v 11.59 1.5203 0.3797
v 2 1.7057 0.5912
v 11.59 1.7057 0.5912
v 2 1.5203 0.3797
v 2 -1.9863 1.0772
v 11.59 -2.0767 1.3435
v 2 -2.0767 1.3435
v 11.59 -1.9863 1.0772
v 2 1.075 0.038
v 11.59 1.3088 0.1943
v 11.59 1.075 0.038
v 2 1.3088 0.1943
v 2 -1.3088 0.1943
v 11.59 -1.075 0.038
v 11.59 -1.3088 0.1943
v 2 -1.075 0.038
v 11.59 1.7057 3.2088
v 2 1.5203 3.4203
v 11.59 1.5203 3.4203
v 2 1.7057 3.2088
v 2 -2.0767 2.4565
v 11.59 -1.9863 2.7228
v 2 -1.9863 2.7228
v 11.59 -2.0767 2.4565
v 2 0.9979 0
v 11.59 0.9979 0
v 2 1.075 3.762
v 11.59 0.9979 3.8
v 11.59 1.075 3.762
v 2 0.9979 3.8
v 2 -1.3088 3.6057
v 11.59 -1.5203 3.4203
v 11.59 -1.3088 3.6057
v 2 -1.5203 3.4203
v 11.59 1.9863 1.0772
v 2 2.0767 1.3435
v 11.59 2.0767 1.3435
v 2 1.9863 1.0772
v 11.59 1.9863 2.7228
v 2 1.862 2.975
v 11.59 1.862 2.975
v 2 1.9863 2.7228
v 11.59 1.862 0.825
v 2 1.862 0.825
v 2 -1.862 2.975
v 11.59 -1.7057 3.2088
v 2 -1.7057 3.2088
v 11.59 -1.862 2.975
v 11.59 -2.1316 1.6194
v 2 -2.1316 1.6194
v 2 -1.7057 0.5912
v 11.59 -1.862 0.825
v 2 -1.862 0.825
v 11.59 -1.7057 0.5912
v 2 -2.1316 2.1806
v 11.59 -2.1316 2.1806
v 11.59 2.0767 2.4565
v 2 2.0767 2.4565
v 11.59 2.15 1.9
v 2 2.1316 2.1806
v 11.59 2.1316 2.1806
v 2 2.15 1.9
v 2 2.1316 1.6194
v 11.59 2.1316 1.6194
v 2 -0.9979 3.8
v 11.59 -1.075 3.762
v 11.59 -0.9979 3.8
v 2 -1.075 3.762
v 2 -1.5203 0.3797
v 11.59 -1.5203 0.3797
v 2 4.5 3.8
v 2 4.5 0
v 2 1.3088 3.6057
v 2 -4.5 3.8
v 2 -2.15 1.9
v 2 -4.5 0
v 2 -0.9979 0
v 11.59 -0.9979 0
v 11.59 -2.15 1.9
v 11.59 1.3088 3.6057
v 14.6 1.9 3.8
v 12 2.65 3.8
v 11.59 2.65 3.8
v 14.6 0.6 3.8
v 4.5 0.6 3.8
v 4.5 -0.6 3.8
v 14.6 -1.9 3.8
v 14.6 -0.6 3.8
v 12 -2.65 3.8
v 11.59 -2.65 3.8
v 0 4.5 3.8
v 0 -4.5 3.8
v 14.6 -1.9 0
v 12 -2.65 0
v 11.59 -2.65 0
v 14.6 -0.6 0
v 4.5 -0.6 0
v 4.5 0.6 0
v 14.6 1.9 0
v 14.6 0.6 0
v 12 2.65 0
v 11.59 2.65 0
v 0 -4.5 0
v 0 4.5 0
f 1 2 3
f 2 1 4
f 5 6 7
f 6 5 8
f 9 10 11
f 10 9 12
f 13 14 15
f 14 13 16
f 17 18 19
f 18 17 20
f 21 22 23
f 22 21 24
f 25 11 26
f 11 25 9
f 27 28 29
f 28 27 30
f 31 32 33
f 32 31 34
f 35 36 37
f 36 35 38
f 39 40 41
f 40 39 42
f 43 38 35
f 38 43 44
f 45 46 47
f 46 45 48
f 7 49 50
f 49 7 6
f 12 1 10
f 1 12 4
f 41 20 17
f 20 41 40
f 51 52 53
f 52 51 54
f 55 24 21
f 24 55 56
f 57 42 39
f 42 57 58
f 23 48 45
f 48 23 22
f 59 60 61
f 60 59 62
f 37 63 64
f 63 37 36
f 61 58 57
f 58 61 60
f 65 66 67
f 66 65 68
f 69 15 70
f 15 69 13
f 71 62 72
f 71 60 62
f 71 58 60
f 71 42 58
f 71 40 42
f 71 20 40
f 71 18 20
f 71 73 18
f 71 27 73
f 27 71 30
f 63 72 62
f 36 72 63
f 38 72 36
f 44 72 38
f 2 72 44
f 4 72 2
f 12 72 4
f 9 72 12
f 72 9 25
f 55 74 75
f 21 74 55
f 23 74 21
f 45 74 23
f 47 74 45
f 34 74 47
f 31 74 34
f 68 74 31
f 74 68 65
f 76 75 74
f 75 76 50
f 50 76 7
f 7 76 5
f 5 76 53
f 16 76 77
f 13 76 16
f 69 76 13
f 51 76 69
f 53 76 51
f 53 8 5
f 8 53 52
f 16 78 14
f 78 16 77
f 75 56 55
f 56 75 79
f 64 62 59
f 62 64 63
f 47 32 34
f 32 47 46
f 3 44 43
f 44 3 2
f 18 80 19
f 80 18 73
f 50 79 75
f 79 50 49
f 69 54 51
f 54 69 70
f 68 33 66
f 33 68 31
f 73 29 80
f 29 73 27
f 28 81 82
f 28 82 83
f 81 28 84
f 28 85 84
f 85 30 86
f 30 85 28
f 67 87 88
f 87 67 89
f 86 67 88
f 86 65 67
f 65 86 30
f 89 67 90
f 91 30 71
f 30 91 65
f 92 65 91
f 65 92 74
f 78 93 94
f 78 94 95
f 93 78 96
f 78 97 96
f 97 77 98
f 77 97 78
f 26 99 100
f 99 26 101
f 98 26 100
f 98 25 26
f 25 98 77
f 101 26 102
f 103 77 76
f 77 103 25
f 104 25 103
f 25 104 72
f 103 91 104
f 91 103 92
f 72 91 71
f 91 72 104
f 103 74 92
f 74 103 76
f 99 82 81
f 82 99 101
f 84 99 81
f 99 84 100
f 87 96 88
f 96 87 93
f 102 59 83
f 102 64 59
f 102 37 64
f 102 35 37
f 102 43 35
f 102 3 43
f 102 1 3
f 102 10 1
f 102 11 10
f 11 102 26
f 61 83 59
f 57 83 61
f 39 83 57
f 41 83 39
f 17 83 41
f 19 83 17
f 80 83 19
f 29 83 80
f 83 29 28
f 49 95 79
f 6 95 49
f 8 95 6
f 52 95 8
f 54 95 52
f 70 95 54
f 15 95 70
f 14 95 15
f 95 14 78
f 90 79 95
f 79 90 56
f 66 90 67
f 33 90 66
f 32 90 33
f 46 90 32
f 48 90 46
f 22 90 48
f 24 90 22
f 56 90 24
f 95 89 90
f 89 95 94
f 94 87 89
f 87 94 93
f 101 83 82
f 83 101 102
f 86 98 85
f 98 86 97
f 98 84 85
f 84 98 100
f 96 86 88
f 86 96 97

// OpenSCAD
/*
  PRINTED HARDWARE KIT for welding_sensor_fixture_v3  (no metal screws, nuts or hose clamps)
  Units: mm. Every part fits the holes and pockets ALREADY in the 4 printed v3 parts.

  Parts (set PART, F6, export STL). Print in PETG if possible (PLA works, is more brittle).
    "camera_pin"        4 (+2 spare)  push pins: camera board -> camera yoke bosses
    "yoke_pin"          4 (+2 spare)  snap pins: camera tilt pivot (2) + lock (2)
    "angle_plate_R"     1 per angle    locks the camera tilt angle, RIGHT cheek (+Y side)
    "angle_plate_L"     1 per angle    same, LEFT cheek (-Y side)          (set ANGLE)
    "block_pin"         4 (+1 spare)  joins torch clamp block to base plate
    "block_fork"        4 (+1 spare)  locking fork for each block pin (slides into the nut slot)
    "laser_clip"        1 per size     replaces laser bar + 2 screws (SIZE 1 = 10.6, 2 = 11.0, 3 = 11.4 mm laser);
                                       spring beam gives the clamping force, no screws
    "strap_short"       2              ratchet strap, torch neck 16-35 mm (replaces hose clamps)
    "strap_long"        2              ratchet strap, torch neck 35-65 mm (needs 220 x 220 bed, print diagonally)
    "inplace_*"         verification only (parts placed in v3 coordinates)

  The v3 laser_bar.stl is NOT used with this kit (the laser clip replaces it).
*/

$fn = 48;
PART = "yoke_pin";
ANGLE = 20;        // camera tilt for the angle plates, degrees (-15 .. 45)
SIZE = 2;          // laser clip size 1/2/3

// ------------------------------------------------------------ v3 geometry (copied from welding_sensor_fixture_v3.scad)
plate_t = 6;
cam_x = 55;  pivot_z = 39.5;  lock_r = 22;
ear_y0 = 21; ear_t = 6; cheek_gap = 0.6; cheek_t = 4;
cheek_y0 = ear_y0 + ear_t + cheek_gap;       // 27.6  cheek inner face
cheek_out = cheek_y0 + cheek_t;              // 31.6  cheek outer face
pocket_shoulder = ear_y0 - 1 + 3.6 + 1;      // 24.6  bottom of the hex pocket in the ear (from inside)
hole_d = 4.5;  slot_w = 4.8;  tilt_min = -15;  tilt_max = 45;
car_top_z = 34;  boss_top = 42;  cam_pitch = 28;  pilot_d = 2.7;  pilot_depth = 7;  board_t = 1.6;
blk_x1 = -22;  blk_w = 46;  trap_z0 = 10.2;  trap_z1 = 13.8;  trap_af = 7.3;  bolt_hole_top = 21;
block_bolts = [[-58,-15],[-58,15],[-28,-15],[-28,15]];
laser_d_design = 11;  cradle_apex = 7.7782;  cradle_back = 13.9782;  cradle_w = 30;  cradle_front = -2.2218;
bar_z0 = 10;  bar_h = 14;
band_slot_t = 2.6;  band_slot_h = 14;

// ------------------------------------------------------------ helpers
// Seven-segment digits (no fonts needed). Height 5, width 3, stroke 0.7.
SEG = [[1,1,1,1,1,1,0],[0,1,1,0,0,0,0],[1,1,0,1,1,0,1],[1,1,1,1,0,0,1],[0,1,1,0,0,1,1],
       [1,0,1,1,0,1,1],[1,0,1,1,1,1,1],[1,1,1,0,0,0,0],[1,1,1,1,1,1,1],[1,1,1,1,0,1,1]];
module digit2d(d, h=5, w=3, s=0.7) {
  segs = [[0,h-s,w,s],[w-s,h/2,s,h/2],[w-s,0,s,h/2],[0,0,w,s],[0,0,s,h/2],[0,h/2,s,h/2],[0,h/2-s/2,w,s]];
  for (i=[0:6]) if (SEG[d][i]==1) translate([segs[i][0],segs[i][1]]) square([segs[i][2],segs[i][3]]);
}
module number2d(n, h=5) {  // non-negative integer up to 99; minus sign drawn as a bar
  a = abs(n);
  if (n < 0) translate([-2.2,h/2-0.35]) square([1.6,0.7]);
  if (a >= 10) { digit2d(floor(a/10), h, h*0.6); translate([h*0.6+0.8,0]) digit2d(a%10, h, h*0.6); }
  else digit2d(a, h, h*0.6);
}

// A pin lying along +X, printed flat: round body with two flats (top/bottom) for strength and bed contact.
module dpin_body(len, d, flat) { intersection() { rotate([0,90,0]) cylinder(d=d, h=len); translate([0,-d,-flat/2]) cube([len, 2*d, flat]); } }

// ============================================================ 1. camera push pin
// head 6.5 x 1.2 | neck 3.3 through the board (1.6) | tapered stem 2.55 -> 2.95 pressed 6 mm into the 2.7 pilot
module camera_pin() {
  cylinder(d=6.5, h=1.2);
  translate([0,0,1.2]) cylinder(d=3.3, h=board_t);
  translate([0,0,1.2+board_t]) cylinder(d1=2.95, d2=2.55, h=6);
}

// ============================================================ 2. yoke snap pin
// grip = angle plate (2.5) + cheek (4) + gap (0.6) + ear hole part (2.4) + 0.1 = 9.6
plate_th = 2.5;
yoke_grip = plate_th + cheek_t + cheek_gap + (ear_y0 + ear_t - pocket_shoulder) + 0.1;
module yoke_pin() {
  d = 4.3; flat = 3.8; split_w = 1.2; barb_w = 5.3; barb_len = 3.0; head_l = 2.0;
  difference() {
    union() {
      translate([-head_l, -4.5, -flat/2]) cube([head_l, 9, flat]);                    // T head 9 x 3.8
      dpin_body(yoke_grip, d, flat);
      // barbs: shoulder at x = grip, taper to the tip
      translate([0,0,-flat/2]) linear_extrude(flat)
        polygon([[yoke_grip-0.01,-barb_w/2],[yoke_grip+0.4,-barb_w/2],[yoke_grip+barb_len,-1.9],
                 [yoke_grip+barb_len,1.9],[yoke_grip+0.4,barb_w/2],[yoke_grip-0.01,barb_w/2]]);
    }
    // split: the two prongs squeeze together through the 4.5 mm holes
    translate([2.5, -split_w/2, -flat]) cube([yoke_grip + barb_len, split_w, 2*flat]);
  }
}

// ============================================================ 3. angle lock plate
// In the cheek plane: u = X - cam_x, v = Z - pivot_z. Lock hole at angle a: (-r cos a, -r sin a).
function lockpt(a, r=lock_r) = [-r*cos(a), -r*sin(a)];
key_w = 4.2;  key_h = cheek_t - 0.6;  key_gap_deg = 12.5;
module key_arc2d(a0, a1) {
  if (a1 - a0 > 0.5)
    for (a=[a0:1:a1-1]) hull() { translate(lockpt(a)) circle(d=key_w); translate(lockpt(min(a+1,a1))) circle(d=key_w); }
}
module plate_outline2d(ang) {
  lo0 = tilt_min; lo1 = ang - key_gap_deg; hi0 = ang + key_gap_deg; hi1 = tilt_max;
  a_min = (lo1 - lo0 >= 2) ? lo0 : ang;
  a_max = (hi1 - hi0 >= 2) ? hi1 : ang;
  hull() {
    circle(r=7.5);
    for (a=[a_min:2:a_max]) translate(lockpt(a)) circle(r=4.6);
    translate(lockpt(a_max)) circle(r=4.6);
    translate(lockpt(ang)) circle(r=5.5);
  }
}
module angle_plate_local(ang, flip_text=false) {  // z=0 is the face that touches the cheek; key goes to -z
  lo0 = tilt_min; lo1 = ang - key_gap_deg; hi0 = ang + key_gap_deg; hi1 = tilt_max;
  difference() {
    union() {
      linear_extrude(plate_th) plate_outline2d(ang);
      translate([0,0,-key_h]) linear_extrude(key_h + 0.01) {
        if (lo1 - lo0 >= 2) key_arc2d(lo0, lo1);
        if (hi1 - hi0 >= 2) key_arc2d(hi0, hi1);
      }
    }
    translate([0,0,-10]) cylinder(d=4.6, h=20);
    translate(concat(lockpt(ang), -10)) cylinder(d=4.6, h=20);
    // engraved angle number on the outside face
    translate([-9.5, 3.5, plate_th - 0.6]) linear_extrude(1)
      if (flip_text) translate([0, 8]) mirror([0,1,0]) number2d(ang, 4); else number2d(ang, 4);
  }
}
// placed on a cheek: side +1 = right (+Y), -1 = left (-Y)
module angle_plate_inplace(ang, side) {
  // local (u, v, w) -> world (x - cam_x, side*w, z - pivot_z): w is the outward normal, key goes inward
  translate([cam_x, side*cheek_out, pivot_z])
    rotate([-side*90, 0, 0]) {
      if (side > 0) mirror([0,1,0]) angle_plate_local(ang, true);
      else angle_plate_local(ang, false);
    }
}

// ============================================================ 4. block pin + fork
// pin from the BACK of the base plate (z<0 is outside) up into the clamp block.
block_neck_d = 2.6;
module block_pin_flat() {  // along +X, x=0 = plate bottom face, head at x<0
  d = 4.3; flat = 3.8;
  translate([-2, -4.5, -flat/2]) cube([2, 9, flat]);                           // head under the plate
  difference() {
    dpin_body(trap_z1 + 2.0, d, flat);                                          // to 2 mm above the slot
    translate([trap_z0 - 0.05, 0, 0]) rotate([0,90,0])
      difference() { cylinder(d=d+1, h=trap_z1 - trap_z0 + 0.1); cylinder(d=block_neck_d, h=trap_z1 - trap_z0 + 0.1); }
  }
}
module block_pin() { rotate([0,-90,0]) block_pin_flat(); }   // standing: +X -> +Z
// fork: slides into the nut slot from the block face, straddles the pin neck. Detent mouth 2.4 < neck 2.6.
module block_fork(face_dist) {   // face_dist = pin centre to block face (6 rear, 8 side)
  w = 7.0; t = 3.3; back = 4.0; tab = 3.0;
  len = back + face_dist + tab;
  difference() {
    translate([-back, -w/2, 0]) cube([len, w, t]);
    // seat for the neck at x=0, opening toward -x (the end that goes in first)
    translate([0,0,-1]) cylinder(d=block_neck_d + 0.25, h=t+2);
    translate([-back-1, -1.2, -1]) cube([back+1, 2.4, t+2]);
    // grip tab ridges
    for (i=[0:2]) translate([face_dist + 0.6 + i*0.9, -w/2-1, t-0.5]) cube([0.45, w+2, 1]);
  }
}

// ============================================================ 5. laser clip
// U clip. A V pad presses the laser into the cradle V. The pad hangs on a thin SPRING BEAM (3 mm)
// that spans between two arms; the arms run along the cradle sides and hook behind its back face.
// The pad is built 'clip_preload' deeper than the laser surface, so the beam bends ~0.6 mm when
// fitted: about 40 N (PETG) clamping force. Sizes for laser diameter 10.6 / 11.0 / 11.4 mm.
clip_preload = 0.6;
function clip_laser_d(s) = s == 1 ? 10.6 : (s == 3 ? 11.4 : 11.0);
module laser_clip(size=2) {
  d = clip_laser_d(size);
  apex = cradle_apex - 1.4142*d + clip_preload;  // relaxed V apex (contact apex + preload)
  vdep = 4.5;  pad_back = 1.5;  pad_w = 12;  beam_t = 3.0;
  arm_y0 = cradle_w/2 + 0.25;  arm_t = 2.6;  lip = 2.0;  lip_t = 2.4;
  hook = cradle_back;                            // lip face touches the cradle back face
  beam_x0 = apex - pad_back - beam_t;
  translate([0,0,bar_z0]) linear_extrude(bar_h) {
    difference() {
      translate([apex - pad_back, -pad_w/2]) square([pad_back + vdep, pad_w]);          // V pad
      translate([apex, 0]) polygon([[0,0],[vdep+1, vdep+1],[vdep+1,-(vdep+1)]]);
    }
    translate([beam_x0, -(arm_y0 + arm_t)]) square([beam_t, 2*(arm_y0 + arm_t)]);       // spring beam
    for (s=[-1,1]) {
      translate([beam_x0, s > 0 ? arm_y0 : -(arm_y0 + arm_t)]) square([hook - beam_x0 + lip_t, arm_t]);   // arm
      translate([hook, s*arm_y0]) polygon(s > 0 ? [[0,0],[lip_t,0],[lip_t,0.01],[0.2,-lip],[0,-lip]]
                                               : [[0,0],[lip_t,0],[lip_t,-0.01],[0.2,lip],[0,lip]]);   // hook + lead-in
    }
  }
  // size mark: 1, 2 or 3 small bumps on top of the +Y arm
  for (i=[0:size-1]) translate([beam_x0 + 6 + i*3, arm_y0 + arm_t/2, bar_z0 + bar_h - 0.01]) cylinder(d=1.6, h=0.6);
}

// ============================================================ 6. ratchet strap (replaces hose clamps)
st_w = 12;  st_base = 1.4;  st_tooth = 0.8;  st_pitch = 1.6;
head_l = 13;  head_w = 18;  head_h = 7;  ch_w = 4.85;  ch_l = st_w + 0.8;  wall = 2.6;
module strap(body_len) {
  // head (x<0), channel along Z; pawl tongue anchored at the bottom, pointing up (+Z = insertion direction)
  cx0 = -head_l + wall;  cx1 = cx0 + ch_w;
  difference() {
    translate([-head_l, -head_w/2, 0]) cube([head_l, head_w, head_h]);
    translate([cx0, -ch_l/2, -1]) cube([ch_w, ch_l, head_h + 2]);
    // arrow (insert direction marker) engraved on top: points toward the channel
    translate([cx1 + 0.8, 0, head_h - 0.5]) linear_extrude(1) polygon([[0,-2],[2.2,0],[0,2]]);
  }
  // pawl tongue: thickness 0.9, length 6, slanted 22 deg from vertical; tip overlaps the teeth by 0.55 mm
  translate([0, -(ch_l-0.8)/2, 0]) rotate([90,0,0]) mirror([0,0,1]) linear_extrude(ch_l - 0.8) {
    hull() { translate([cx0 + 0.4, 0.8]) circle(d=0.9); translate([cx0 + 0.5 + 6*sin(22), 0.8 + 6*cos(22)]) circle(d=0.9); }
    translate([cx0 - 0.01, 0]) square([1.0, 1.6]);   // root: fused to the channel wall and the bed
  }
  // strap body with sawtooth on top: vertical face on the head side, ramp descending toward the tail
  tail_taper = 15;
  teeth_from = 8;
  difference() {
    union() {
      hull() { translate([-0.01, -st_w/2, 0]) cube([body_len - tail_taper, st_w, st_base]);
               translate([body_len - 0.5, -4, 0]) cube([0.5, 8, st_base]); }
      intersection() {
        for (x=[teeth_from:st_pitch:body_len - st_pitch])
          translate([x, st_w/2, st_base - 0.01]) rotate([90,0,0]) linear_extrude(st_w)
            polygon([[0,0],[0,st_tooth],[st_pitch,0]]);
        hull() { translate([-0.01, -st_w/2, 0]) cube([body_len - tail_taper, st_w, 5]);
                 translate([body_len - 0.5, -4, 0]) cube([0.5, 8, 5]); }
      }
    }
  }
}

// ============================================================ in-place placements (verification only)
module yoke_pin_inplace(side, u, v) {   // pin axis along Y, head outside
  translate([cam_x + u, side*(cheek_out + plate_th), pivot_z + v]) rotate([0,0,-side*90]) yoke_pin();
}
module camera_pins_inplace() {
  for (sx=[-1,1], sy=[-1,1]) translate([cam_x + sx*cam_pitch/2, sy*cam_pitch/2, boss_top + board_t + 1.2]) mirror([0,0,1]) camera_pin();
}
module block_pins_inplace() { for (p=block_bolts) translate([p[0], p[1], 0]) block_pin(); }
module block_forks_inplace() {
  for (p=block_bolts) {
    rear = p[0] > -53;
    translate([p[0], p[1], trap_z0 + 0.15])
      rotate([0,0, rear ? 0 : (p[1] > 0 ? 90 : -90)]) block_fork(rear ? (blk_x1 - p[0]) : (blk_w/2 - abs(p[1])));
  }
}

// ============================================================ output (print orientation unless inplace)
if (PART == "camera_pin") camera_pin();
else if (PART == "yoke_pin") translate([2, 0, 1.9]) yoke_pin();
else if (PART == "angle_plate_R") translate([0,0,plate_th]) rotate([180,0,0]) mirror([0,1,0]) angle_plate_local(ANGLE, true);
else if (PART == "angle_plate_L") translate([0,0,plate_th]) rotate([180,0,0]) angle_plate_local(ANGLE, false);
else if (PART == "block_pin") translate([2,0,1.9]) block_pin_flat();
else if (PART == "block_fork_rear") block_fork(6);
else if (PART == "block_fork_side") block_fork(8);
else if (PART == "laser_clip") translate([0,0,-bar_z0]) laser_clip(SIZE);
else if (PART == "strap_short") strap(185);
else if (PART == "strap_long") strap(260);
else if (PART == "inplace_yoke_pins") {
  for (s=[-1,1]) { yoke_pin_inplace(s, 0, 0); yoke_pin_inplace(s, lockpt(ANGLE)[0], lockpt(ANGLE)[1]); }
}
else if (PART == "inplace_angle_plates") { angle_plate_inplace(ANGLE, 1); angle_plate_inplace(ANGLE, -1); }
else if (PART == "inplace_camera_pins") camera_pins_inplace();
else if (PART == "inplace_block_pins") block_pins_inplace();
else if (PART == "inplace_block_forks") block_forks_inplace();
else if (PART == "inplace_laser_clip") laser_clip(SIZE);
